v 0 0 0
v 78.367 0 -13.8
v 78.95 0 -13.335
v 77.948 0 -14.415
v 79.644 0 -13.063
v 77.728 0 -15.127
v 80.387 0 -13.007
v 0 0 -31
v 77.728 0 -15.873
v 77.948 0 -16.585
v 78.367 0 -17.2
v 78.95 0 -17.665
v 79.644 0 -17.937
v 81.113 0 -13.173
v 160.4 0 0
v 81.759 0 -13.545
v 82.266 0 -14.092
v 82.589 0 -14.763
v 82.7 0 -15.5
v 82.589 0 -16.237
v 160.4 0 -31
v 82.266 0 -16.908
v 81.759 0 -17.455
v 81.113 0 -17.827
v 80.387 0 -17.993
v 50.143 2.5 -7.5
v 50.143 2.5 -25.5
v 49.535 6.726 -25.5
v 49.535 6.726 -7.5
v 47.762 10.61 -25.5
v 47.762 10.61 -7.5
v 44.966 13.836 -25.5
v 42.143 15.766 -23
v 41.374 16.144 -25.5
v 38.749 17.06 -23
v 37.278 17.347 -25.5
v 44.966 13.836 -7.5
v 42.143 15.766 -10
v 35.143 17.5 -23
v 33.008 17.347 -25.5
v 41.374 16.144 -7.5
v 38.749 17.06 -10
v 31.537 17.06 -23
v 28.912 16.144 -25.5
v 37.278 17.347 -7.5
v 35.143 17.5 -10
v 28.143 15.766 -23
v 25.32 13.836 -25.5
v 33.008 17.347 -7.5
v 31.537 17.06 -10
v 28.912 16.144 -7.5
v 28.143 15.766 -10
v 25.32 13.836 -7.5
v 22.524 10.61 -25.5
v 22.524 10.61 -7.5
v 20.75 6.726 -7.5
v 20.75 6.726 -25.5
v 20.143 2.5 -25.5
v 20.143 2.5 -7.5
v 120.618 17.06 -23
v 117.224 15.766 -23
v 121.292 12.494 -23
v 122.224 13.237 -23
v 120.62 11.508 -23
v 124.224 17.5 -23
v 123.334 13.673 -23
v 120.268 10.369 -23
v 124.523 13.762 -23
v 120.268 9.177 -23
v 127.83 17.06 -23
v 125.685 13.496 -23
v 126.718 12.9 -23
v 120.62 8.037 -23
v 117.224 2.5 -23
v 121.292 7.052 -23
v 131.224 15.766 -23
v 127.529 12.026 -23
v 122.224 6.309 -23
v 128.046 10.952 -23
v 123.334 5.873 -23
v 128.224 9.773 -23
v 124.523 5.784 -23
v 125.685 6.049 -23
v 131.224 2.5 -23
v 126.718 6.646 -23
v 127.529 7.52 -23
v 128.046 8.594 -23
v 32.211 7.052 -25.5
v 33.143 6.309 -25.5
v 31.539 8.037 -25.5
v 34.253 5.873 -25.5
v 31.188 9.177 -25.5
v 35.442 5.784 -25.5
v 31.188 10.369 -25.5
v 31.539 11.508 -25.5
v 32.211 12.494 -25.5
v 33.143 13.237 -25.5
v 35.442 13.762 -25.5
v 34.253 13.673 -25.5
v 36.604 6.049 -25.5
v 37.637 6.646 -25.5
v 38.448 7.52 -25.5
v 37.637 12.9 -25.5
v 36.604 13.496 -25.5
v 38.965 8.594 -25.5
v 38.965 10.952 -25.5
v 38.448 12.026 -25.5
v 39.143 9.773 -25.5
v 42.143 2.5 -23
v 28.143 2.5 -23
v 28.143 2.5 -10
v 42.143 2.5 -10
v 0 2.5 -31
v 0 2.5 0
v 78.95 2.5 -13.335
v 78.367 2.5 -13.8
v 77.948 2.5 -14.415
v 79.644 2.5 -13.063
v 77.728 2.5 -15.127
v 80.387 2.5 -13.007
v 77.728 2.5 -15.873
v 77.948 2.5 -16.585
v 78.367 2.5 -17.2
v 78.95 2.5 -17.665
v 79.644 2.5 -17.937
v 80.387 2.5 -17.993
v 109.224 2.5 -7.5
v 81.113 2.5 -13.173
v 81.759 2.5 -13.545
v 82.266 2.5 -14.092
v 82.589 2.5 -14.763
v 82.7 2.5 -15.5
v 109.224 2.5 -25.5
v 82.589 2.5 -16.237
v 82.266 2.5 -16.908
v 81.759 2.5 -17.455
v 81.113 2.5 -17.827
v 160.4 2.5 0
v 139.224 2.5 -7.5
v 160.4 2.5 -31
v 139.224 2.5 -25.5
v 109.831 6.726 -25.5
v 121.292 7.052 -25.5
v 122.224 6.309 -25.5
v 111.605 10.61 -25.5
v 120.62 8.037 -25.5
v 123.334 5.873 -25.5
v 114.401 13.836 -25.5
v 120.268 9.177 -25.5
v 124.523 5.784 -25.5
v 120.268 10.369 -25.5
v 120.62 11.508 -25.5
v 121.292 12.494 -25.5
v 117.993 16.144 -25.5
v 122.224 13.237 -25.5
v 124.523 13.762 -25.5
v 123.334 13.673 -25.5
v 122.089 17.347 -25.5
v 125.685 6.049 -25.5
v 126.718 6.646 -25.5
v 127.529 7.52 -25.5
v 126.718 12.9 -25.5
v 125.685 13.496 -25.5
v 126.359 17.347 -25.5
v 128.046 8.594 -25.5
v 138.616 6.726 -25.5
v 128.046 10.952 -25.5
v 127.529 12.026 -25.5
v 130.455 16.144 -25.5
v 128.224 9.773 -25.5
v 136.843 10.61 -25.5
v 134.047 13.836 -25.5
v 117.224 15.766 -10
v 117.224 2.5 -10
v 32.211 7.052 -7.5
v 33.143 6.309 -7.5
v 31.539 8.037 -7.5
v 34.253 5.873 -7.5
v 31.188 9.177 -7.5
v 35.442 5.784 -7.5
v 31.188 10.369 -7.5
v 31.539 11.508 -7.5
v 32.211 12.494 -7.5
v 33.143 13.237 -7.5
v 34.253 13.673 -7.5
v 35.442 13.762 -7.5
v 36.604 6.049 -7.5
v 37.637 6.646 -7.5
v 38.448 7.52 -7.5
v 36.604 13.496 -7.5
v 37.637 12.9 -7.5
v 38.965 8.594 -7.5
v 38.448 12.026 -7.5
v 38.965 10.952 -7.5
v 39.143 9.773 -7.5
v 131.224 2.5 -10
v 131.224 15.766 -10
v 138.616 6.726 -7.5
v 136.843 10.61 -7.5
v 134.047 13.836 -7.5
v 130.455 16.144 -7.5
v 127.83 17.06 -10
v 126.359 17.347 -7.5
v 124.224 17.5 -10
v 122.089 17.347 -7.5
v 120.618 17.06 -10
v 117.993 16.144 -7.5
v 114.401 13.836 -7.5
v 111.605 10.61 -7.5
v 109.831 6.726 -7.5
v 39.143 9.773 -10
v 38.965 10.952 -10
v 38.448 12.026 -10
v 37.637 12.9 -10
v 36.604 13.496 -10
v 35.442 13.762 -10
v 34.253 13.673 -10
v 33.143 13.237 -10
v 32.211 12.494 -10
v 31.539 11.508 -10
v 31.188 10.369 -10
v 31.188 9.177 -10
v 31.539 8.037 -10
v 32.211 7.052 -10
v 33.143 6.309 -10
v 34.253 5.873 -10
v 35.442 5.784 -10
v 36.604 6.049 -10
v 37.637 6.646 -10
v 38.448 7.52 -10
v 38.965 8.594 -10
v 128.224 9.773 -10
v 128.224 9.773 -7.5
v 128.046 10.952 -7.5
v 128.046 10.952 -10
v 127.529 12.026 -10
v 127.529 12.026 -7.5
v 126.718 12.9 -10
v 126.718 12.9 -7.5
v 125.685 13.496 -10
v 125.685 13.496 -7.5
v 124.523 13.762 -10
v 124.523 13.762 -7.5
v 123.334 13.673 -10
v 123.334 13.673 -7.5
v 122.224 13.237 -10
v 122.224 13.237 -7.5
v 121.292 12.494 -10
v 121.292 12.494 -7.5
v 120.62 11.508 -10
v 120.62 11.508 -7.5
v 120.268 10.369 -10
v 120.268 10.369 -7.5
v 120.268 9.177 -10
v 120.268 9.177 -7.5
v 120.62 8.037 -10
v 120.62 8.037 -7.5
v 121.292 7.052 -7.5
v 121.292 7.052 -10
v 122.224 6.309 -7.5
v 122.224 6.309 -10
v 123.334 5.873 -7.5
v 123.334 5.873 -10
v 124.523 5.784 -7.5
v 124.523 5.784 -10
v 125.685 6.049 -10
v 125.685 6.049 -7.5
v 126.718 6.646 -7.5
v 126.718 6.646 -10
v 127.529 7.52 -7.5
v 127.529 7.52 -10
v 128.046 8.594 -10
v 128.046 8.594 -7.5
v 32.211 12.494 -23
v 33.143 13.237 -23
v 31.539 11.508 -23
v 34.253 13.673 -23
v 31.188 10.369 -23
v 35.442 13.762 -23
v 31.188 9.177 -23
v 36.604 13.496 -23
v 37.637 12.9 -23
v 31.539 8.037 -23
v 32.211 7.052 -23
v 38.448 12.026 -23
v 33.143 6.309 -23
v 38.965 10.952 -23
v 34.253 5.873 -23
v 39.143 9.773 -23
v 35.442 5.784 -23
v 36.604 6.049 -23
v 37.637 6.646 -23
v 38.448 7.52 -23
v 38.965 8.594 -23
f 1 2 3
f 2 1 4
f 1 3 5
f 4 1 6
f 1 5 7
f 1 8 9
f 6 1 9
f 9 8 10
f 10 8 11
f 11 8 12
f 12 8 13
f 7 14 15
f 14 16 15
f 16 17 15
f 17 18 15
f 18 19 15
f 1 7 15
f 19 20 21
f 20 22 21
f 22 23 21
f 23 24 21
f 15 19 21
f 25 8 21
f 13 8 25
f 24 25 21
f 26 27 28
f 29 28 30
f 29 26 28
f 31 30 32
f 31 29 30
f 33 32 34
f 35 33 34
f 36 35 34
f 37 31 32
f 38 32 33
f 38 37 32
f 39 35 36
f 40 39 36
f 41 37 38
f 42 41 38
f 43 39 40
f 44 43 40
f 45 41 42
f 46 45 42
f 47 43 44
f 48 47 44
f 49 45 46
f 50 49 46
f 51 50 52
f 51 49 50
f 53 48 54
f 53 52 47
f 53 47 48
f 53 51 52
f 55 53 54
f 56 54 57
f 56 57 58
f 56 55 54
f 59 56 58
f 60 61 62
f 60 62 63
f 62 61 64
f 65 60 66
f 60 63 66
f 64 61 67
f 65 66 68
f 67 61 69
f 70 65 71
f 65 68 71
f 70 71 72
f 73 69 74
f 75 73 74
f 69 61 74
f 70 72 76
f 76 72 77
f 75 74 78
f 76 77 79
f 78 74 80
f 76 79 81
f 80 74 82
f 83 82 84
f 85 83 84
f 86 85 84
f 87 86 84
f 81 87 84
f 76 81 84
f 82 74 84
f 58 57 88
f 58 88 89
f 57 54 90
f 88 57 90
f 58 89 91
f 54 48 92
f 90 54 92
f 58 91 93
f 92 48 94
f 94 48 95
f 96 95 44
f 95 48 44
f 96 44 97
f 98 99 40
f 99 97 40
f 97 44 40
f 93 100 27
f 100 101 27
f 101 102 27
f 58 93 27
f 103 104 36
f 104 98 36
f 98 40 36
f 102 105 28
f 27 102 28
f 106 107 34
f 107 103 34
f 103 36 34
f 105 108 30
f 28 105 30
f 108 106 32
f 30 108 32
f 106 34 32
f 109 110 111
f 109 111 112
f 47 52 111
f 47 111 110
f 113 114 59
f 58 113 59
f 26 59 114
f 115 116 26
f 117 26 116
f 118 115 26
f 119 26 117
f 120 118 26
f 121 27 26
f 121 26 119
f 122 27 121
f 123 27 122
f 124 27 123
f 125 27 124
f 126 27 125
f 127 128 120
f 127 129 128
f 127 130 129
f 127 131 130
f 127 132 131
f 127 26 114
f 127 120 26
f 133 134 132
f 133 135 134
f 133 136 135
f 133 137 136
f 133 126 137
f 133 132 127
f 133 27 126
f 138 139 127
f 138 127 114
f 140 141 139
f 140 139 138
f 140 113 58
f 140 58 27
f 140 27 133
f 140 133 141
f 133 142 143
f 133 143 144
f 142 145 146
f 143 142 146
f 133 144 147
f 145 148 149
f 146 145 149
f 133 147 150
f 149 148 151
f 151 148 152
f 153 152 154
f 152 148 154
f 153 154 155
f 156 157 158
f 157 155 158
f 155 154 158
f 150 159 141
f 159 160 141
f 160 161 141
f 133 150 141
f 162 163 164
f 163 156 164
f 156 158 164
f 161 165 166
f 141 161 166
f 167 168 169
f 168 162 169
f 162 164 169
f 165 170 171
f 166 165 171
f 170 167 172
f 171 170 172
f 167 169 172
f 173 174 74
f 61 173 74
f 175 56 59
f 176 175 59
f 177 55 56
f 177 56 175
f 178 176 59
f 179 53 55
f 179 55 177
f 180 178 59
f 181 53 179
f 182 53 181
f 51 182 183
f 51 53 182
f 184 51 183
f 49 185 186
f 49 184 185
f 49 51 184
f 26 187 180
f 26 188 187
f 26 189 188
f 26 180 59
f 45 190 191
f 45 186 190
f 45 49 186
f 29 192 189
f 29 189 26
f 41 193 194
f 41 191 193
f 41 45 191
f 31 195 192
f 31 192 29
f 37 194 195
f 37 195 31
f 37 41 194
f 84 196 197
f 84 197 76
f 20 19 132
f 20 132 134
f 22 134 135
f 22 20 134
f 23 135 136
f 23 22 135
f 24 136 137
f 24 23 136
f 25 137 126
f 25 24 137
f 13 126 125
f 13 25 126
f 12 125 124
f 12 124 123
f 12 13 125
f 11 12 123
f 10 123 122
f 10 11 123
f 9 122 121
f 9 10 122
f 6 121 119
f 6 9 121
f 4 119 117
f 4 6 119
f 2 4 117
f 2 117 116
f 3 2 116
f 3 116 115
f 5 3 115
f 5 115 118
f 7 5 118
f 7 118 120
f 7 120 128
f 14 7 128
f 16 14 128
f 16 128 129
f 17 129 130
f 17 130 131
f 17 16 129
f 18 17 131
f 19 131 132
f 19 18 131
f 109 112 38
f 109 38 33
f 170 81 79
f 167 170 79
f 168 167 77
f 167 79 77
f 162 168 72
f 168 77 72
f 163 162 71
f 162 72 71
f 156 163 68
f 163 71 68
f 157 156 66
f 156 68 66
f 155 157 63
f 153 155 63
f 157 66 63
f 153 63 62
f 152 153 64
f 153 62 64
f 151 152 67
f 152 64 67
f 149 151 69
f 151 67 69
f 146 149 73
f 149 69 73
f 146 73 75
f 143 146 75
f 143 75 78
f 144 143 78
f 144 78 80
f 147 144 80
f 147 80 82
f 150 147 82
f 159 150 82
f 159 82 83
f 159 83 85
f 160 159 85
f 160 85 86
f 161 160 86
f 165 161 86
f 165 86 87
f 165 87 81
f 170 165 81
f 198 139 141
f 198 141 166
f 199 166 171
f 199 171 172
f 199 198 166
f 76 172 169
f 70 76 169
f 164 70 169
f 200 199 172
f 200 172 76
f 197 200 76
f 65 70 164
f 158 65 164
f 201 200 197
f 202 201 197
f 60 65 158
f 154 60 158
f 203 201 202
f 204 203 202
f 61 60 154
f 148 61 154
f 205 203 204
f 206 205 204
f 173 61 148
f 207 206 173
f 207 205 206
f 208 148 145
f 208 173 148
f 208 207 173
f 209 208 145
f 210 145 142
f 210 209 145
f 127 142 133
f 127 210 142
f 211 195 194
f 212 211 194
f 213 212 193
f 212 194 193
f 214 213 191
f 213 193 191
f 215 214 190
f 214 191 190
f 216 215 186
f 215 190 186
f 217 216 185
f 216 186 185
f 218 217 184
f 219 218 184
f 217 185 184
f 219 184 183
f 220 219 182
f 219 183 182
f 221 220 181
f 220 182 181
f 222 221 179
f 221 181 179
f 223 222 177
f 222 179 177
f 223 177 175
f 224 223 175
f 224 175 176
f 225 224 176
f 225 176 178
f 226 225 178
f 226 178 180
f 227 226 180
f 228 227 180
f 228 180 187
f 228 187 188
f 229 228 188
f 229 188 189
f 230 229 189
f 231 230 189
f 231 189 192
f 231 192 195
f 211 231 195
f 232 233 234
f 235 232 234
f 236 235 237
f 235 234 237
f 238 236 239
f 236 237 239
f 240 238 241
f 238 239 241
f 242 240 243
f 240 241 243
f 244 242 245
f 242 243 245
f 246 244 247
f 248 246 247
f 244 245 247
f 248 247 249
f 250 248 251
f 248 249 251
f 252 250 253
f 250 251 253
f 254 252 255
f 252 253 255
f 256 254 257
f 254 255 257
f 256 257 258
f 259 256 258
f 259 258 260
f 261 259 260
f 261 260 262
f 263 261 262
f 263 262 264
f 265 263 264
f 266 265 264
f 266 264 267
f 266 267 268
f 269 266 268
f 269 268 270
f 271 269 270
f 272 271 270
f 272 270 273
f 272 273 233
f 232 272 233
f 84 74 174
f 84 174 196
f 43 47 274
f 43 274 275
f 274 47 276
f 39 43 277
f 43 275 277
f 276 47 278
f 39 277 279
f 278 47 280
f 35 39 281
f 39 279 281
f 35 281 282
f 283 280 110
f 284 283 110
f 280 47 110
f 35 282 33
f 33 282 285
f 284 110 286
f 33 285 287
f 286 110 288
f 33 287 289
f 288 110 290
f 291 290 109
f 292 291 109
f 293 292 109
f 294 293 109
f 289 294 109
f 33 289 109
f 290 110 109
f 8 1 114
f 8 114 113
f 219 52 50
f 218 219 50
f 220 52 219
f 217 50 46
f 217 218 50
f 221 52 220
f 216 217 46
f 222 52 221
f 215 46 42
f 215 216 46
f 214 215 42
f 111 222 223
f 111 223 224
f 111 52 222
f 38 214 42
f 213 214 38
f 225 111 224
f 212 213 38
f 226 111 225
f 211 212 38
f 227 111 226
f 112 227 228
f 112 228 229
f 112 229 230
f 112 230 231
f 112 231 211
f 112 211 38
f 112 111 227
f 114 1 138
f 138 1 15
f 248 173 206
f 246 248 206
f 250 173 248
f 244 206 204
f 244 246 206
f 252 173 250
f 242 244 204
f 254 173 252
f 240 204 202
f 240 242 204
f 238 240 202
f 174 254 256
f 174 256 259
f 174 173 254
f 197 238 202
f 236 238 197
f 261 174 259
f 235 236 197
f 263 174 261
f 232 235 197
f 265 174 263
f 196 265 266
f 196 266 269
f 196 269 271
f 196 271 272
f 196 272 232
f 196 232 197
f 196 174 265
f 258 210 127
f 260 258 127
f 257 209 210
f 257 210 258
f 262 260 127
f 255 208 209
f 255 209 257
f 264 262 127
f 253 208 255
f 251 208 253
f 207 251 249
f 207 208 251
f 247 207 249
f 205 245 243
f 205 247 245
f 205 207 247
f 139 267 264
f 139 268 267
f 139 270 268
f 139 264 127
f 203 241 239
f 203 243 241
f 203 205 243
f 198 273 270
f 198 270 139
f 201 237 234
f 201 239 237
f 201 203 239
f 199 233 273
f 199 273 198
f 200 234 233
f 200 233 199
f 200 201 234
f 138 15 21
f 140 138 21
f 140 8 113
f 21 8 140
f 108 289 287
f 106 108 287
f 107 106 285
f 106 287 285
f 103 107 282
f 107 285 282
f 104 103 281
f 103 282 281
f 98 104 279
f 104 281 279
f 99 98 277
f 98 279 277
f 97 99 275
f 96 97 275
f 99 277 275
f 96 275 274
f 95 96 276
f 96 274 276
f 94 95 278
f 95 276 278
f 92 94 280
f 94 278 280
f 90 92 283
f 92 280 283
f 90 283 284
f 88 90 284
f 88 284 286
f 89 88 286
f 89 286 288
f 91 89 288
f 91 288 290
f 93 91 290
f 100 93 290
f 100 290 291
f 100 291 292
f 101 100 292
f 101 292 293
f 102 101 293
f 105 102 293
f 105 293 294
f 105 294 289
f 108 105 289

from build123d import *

# Parameters (mm, degrees)
SKETCH1_W           = 160.4
SKETCH1_H           = 31
SKETCH1_R           = 2.5
BOSS_EXTRUDE1_DEPTH = 2.5
BOSS_EXTRUDE2_START = -7.5
SKETCH2_R           = 4
BOSS_EXTRUDE2_DEPTH = 18
SKETCH3_W           = 14
SKETCH3_H           = 13
CUT_EXTRUDE1_DEPTH  = 18


with BuildPart() as part:
    # Sketch1 → Boss-Extrude1 (new body)
    with BuildSketch(Plane(origin=(0, 0, 0), x_dir=(1, 0, 0), z_dir=(0, 1, 0))):
        with Locations((80.2, 15.5)):
            Rectangle(SKETCH1_W, SKETCH1_H)
        with Locations((80.2, 15.5)):
            Circle(SKETCH1_R, mode=Mode.SUBTRACT)
    extrude(amount=BOSS_EXTRUDE1_DEPTH)

    # Sketch2 → Boss-Extrude2 (add)
    with BuildSketch(Plane.XY.offset(BOSS_EXTRUDE2_START)):
        with BuildLine():
            Line((20.142837701, 2.5), (50.142837701, 2.5))
            ThreePointArc((50.142837701, 2.5), (35.142837701, 17.5), (20.142837701, 2.5))
        make_face()
        with Locations((35.142837701, 9.772919339)):
            Circle(SKETCH2_R, mode=Mode.SUBTRACT)
        with BuildLine():
            Line((109.22381187, 2.5), (139.22381187, 2.5))
            ThreePointArc((139.22381187, 2.5), (124.22381187, 17.5), (109.22381187, 2.5))
        make_face()
        with Locations((124.22381187, 9.772919339)):
            Circle(SKETCH2_R, mode=Mode.SUBTRACT)
    extrude(amount=-BOSS_EXTRUDE2_DEPTH)

    # Sketch3 → Cut-Extrude1 (cut)
    with BuildSketch(Plane(origin=(0, 2.5, 0), x_dir=(1, 0, 0), z_dir=(0, 1, 0))):
        with Locations((35.142837701, 16.5)):
            Rectangle(SKETCH3_W, SKETCH3_H)
        with Locations((124.22381187, 16.5)):
            Rectangle(SKETCH3_W, SKETCH3_H)
    extrude(amount=CUT_EXTRUDE1_DEPTH, mode=Mode.SUBTRACT)


solid = part.part
